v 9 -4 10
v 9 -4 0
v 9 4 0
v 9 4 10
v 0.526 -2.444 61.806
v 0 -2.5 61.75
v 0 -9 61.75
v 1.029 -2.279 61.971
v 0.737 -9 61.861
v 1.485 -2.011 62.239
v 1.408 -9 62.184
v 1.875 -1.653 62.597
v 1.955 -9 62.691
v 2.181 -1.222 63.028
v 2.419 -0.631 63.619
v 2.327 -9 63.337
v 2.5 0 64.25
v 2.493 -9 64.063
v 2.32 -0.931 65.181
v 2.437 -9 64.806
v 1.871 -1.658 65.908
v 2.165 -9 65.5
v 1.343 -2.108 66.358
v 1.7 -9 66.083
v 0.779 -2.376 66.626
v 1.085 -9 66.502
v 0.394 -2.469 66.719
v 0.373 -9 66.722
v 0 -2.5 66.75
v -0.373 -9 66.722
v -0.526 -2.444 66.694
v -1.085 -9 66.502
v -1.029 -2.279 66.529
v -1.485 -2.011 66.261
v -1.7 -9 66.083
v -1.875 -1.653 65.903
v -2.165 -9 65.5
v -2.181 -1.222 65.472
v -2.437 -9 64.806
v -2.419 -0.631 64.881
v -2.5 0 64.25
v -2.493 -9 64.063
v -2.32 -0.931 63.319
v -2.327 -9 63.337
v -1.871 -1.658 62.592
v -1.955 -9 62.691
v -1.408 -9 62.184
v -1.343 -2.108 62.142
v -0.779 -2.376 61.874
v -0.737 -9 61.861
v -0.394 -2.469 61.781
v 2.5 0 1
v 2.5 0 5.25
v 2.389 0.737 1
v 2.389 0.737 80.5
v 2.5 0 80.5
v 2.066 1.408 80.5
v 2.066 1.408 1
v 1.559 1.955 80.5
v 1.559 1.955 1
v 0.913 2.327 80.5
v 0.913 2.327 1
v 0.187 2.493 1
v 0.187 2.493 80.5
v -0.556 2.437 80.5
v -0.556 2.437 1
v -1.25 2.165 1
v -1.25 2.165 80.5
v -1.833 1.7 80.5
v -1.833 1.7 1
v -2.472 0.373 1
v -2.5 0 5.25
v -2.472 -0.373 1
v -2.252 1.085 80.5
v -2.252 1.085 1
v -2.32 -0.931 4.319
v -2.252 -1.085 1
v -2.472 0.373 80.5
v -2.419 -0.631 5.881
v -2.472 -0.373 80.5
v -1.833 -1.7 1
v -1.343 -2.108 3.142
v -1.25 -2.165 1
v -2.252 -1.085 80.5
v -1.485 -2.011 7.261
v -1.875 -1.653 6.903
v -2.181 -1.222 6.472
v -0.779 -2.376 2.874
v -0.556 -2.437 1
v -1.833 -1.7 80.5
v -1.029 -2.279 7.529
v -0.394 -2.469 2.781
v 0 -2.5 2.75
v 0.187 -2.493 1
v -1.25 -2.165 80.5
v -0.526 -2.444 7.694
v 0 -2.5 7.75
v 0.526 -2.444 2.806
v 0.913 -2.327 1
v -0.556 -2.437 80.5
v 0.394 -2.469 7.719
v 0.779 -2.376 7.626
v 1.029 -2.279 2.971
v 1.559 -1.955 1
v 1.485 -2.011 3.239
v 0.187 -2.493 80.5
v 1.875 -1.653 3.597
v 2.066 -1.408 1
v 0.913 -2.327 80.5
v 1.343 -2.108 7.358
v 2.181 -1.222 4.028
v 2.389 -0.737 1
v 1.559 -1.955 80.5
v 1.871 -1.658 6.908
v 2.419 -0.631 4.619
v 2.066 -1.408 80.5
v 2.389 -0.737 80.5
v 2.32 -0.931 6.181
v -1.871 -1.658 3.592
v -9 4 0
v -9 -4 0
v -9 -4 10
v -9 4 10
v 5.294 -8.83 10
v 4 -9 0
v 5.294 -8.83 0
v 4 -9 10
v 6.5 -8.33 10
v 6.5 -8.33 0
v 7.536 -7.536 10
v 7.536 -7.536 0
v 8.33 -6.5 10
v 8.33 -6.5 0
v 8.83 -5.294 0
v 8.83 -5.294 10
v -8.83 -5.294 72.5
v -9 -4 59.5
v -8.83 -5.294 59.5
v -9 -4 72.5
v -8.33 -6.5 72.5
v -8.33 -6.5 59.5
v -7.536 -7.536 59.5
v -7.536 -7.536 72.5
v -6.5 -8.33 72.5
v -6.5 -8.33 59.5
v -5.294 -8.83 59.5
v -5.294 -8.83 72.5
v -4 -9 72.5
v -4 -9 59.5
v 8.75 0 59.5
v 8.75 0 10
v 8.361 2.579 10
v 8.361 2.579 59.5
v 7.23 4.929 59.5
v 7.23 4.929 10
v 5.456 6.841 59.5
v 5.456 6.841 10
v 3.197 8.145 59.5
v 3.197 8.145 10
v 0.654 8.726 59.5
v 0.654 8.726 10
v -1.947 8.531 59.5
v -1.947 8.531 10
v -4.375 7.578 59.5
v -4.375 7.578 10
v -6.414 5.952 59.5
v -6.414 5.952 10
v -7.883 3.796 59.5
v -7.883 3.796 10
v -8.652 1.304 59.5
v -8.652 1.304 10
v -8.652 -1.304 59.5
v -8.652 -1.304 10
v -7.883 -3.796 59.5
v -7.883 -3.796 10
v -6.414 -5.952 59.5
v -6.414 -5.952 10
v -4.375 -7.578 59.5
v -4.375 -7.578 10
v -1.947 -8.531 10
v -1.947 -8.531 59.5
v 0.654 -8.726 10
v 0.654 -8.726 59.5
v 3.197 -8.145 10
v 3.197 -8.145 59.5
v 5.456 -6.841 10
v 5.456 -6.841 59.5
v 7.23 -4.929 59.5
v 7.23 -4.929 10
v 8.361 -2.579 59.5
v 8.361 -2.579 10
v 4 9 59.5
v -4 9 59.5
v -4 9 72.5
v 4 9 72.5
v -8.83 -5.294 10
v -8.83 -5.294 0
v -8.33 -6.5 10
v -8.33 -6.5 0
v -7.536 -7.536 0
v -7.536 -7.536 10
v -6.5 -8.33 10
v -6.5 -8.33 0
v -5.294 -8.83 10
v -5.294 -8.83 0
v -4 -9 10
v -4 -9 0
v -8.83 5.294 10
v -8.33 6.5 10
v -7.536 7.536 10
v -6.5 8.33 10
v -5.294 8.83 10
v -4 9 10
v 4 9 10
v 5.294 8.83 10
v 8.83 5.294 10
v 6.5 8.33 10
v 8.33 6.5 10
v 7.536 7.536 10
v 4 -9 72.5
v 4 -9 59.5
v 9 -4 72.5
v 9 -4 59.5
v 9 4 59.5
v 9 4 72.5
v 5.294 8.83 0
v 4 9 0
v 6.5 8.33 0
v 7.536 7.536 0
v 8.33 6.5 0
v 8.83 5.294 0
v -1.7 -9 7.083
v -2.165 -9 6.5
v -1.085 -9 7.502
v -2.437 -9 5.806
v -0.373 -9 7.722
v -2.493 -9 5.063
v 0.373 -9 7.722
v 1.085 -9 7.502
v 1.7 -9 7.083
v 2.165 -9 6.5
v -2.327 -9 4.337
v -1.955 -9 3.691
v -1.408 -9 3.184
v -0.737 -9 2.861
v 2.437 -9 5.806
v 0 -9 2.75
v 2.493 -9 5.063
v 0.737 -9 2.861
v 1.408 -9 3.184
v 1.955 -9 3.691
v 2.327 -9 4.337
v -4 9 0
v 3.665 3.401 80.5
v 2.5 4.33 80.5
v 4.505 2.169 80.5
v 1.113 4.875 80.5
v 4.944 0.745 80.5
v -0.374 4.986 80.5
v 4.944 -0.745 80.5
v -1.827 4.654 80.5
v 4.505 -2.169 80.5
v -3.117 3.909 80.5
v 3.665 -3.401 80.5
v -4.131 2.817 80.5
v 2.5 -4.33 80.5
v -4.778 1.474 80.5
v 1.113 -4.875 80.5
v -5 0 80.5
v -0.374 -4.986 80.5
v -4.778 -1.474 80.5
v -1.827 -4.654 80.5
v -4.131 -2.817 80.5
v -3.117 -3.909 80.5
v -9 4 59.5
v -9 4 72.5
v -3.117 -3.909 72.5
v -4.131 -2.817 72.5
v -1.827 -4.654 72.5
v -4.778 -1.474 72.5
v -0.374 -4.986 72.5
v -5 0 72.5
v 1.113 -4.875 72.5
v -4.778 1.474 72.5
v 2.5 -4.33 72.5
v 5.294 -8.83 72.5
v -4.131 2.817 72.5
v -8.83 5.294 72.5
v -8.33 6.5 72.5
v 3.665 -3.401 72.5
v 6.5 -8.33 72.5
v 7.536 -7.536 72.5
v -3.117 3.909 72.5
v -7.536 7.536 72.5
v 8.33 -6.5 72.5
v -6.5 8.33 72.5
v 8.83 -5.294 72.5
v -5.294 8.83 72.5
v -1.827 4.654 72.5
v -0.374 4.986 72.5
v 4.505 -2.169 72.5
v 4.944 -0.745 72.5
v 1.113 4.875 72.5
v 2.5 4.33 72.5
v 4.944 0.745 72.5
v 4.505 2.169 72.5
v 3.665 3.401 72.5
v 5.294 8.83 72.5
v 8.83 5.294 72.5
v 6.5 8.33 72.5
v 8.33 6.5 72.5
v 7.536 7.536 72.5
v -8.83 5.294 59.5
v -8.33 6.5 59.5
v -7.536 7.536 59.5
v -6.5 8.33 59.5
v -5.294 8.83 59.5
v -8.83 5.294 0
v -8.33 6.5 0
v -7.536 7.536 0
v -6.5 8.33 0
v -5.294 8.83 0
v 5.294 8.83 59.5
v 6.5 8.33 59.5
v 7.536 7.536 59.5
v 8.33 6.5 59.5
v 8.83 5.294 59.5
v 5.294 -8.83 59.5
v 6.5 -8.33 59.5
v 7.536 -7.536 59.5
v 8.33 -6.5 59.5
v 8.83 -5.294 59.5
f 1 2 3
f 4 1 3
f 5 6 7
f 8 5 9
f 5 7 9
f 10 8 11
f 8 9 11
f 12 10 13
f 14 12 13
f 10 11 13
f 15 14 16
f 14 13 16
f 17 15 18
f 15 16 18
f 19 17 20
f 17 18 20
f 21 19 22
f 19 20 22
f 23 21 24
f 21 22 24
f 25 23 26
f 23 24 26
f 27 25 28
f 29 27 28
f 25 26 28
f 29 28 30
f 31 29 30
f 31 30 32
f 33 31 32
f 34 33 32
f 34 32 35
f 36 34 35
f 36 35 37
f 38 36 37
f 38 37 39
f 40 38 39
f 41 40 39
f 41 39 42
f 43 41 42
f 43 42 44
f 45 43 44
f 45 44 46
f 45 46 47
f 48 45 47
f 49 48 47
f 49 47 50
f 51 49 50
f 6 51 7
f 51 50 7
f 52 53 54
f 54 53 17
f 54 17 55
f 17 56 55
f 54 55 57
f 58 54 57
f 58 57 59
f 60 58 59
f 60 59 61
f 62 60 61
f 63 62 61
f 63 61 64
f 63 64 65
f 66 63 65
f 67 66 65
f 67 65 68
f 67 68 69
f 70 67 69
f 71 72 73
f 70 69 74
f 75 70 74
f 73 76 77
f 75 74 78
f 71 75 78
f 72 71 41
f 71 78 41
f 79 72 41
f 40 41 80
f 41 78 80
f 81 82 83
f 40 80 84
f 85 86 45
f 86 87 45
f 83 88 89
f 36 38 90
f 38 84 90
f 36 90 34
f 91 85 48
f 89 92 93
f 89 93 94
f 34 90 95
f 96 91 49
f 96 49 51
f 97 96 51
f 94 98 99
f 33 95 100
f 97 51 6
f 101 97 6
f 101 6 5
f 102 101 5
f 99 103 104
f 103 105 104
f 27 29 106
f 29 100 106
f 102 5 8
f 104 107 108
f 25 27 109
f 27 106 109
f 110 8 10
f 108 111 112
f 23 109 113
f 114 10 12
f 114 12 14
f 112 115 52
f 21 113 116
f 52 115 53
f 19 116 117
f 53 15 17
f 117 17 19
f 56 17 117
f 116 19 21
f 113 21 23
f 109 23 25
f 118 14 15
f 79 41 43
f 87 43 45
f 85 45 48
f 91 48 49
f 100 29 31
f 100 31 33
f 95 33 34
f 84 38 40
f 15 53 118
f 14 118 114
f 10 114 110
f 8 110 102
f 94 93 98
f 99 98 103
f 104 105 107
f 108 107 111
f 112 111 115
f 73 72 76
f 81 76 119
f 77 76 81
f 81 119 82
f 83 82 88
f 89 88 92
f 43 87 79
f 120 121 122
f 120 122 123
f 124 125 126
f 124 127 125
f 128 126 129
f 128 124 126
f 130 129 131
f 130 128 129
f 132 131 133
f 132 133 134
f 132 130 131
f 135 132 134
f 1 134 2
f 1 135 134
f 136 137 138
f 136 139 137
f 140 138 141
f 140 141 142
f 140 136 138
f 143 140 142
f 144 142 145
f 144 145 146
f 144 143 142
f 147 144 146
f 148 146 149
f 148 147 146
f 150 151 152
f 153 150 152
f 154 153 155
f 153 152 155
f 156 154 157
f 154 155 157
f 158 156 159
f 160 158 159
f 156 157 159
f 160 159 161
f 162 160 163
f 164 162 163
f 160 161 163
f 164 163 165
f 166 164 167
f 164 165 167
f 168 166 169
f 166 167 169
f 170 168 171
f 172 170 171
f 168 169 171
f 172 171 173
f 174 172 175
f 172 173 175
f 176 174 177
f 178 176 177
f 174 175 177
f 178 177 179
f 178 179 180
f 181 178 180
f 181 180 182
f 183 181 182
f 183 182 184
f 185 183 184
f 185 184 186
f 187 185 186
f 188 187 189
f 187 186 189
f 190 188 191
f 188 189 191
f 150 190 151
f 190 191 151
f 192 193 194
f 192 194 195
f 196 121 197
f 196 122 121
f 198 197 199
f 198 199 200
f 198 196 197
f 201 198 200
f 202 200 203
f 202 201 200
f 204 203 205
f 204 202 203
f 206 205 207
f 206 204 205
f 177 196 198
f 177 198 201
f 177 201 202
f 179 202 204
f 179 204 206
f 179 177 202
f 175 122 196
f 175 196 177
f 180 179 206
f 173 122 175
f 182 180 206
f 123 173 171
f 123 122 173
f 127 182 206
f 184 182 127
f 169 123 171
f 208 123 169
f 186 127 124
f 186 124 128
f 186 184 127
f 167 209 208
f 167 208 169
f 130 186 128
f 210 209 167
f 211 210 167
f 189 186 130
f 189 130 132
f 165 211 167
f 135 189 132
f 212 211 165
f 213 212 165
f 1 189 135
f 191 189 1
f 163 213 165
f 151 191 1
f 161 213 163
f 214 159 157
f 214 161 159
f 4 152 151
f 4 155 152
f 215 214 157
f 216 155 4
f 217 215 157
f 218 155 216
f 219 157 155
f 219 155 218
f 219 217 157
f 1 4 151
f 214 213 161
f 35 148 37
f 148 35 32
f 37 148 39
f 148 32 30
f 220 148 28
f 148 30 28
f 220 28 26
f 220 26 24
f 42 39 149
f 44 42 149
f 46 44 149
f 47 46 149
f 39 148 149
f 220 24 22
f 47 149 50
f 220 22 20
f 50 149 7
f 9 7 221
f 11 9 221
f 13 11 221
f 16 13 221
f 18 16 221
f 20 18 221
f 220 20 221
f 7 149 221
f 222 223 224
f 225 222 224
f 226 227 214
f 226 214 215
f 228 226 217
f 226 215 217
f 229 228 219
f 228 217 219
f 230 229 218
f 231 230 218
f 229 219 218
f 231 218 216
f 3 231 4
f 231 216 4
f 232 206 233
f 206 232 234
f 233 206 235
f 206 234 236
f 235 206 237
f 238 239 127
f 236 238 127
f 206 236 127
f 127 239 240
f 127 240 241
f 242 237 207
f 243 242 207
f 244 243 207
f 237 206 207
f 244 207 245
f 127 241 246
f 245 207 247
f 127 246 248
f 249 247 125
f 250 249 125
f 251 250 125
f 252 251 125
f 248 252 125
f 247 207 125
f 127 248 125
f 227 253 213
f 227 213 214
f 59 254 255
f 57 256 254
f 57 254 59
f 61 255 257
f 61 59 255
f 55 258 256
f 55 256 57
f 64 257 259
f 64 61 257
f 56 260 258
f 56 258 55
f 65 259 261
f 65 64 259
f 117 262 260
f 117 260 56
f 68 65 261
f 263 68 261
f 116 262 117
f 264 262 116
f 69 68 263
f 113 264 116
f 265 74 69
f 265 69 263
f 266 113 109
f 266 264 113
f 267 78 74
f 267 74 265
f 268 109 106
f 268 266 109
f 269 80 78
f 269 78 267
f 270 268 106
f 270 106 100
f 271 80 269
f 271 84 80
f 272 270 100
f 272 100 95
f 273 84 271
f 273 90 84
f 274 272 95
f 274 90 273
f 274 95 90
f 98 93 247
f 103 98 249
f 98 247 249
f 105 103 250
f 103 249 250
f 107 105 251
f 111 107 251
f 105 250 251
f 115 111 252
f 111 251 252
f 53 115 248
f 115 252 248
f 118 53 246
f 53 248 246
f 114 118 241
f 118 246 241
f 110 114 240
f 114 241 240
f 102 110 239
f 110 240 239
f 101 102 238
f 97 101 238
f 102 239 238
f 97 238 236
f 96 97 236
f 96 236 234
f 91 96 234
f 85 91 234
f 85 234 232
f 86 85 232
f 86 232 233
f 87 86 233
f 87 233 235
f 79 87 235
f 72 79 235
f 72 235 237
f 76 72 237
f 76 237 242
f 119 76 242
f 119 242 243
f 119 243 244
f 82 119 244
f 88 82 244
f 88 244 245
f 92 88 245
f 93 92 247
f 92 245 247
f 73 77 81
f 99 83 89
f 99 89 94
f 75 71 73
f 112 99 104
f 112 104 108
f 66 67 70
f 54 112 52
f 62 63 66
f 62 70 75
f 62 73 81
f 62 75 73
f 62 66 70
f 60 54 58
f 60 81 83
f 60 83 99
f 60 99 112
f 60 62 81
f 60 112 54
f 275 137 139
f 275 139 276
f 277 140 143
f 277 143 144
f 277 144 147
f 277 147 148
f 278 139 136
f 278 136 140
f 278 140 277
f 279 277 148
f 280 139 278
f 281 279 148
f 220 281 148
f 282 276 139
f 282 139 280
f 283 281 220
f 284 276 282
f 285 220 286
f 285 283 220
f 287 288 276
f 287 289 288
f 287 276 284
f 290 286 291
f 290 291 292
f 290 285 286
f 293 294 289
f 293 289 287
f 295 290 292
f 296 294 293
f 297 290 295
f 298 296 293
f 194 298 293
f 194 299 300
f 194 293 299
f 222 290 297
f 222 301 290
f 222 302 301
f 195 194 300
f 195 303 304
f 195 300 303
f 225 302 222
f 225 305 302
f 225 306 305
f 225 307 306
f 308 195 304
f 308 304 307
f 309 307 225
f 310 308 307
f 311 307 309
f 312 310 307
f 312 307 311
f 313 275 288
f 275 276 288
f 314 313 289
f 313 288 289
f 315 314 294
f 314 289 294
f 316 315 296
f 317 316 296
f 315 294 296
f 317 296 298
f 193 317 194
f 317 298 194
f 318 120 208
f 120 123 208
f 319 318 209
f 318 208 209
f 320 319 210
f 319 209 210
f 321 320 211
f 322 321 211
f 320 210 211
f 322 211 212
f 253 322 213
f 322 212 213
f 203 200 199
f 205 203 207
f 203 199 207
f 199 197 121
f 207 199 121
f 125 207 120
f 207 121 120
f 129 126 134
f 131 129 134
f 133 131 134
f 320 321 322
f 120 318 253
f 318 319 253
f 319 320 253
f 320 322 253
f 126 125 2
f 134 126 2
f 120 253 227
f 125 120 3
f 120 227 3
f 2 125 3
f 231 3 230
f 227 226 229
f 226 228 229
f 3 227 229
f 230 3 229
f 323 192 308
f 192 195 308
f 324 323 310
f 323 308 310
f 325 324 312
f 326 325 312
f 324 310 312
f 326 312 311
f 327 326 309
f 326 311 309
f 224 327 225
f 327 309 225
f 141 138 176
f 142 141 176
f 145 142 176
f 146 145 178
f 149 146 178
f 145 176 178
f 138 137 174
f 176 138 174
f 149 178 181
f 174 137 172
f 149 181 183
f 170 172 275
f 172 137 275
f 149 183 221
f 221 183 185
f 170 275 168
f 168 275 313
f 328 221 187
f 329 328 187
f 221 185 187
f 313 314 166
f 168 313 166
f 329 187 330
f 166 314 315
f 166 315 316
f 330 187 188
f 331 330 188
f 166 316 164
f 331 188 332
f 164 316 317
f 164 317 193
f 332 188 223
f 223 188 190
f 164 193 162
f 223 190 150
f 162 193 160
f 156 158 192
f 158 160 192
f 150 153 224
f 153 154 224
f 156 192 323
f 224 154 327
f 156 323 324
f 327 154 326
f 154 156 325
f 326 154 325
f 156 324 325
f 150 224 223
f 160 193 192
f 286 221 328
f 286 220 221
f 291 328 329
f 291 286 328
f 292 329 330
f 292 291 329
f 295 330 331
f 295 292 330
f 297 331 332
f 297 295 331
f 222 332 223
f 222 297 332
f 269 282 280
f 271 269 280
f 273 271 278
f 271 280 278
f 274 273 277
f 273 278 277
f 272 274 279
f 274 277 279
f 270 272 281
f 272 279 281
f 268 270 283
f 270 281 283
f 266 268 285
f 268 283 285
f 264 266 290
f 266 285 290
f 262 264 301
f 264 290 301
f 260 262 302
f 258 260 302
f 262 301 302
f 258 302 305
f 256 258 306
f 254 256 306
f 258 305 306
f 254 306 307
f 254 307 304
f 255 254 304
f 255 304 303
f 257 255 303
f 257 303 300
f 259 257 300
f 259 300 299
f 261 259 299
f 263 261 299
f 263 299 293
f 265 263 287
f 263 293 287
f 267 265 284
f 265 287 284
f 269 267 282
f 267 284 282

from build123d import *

# Parameters (mm, degrees)
SKETCH_1_W               = 18
SKETCH_1_H               = 18
EXTRUDE_1_DEPTH          = 10
SKETCH_2_R               = 8.75
EXTRUDE_2_DEPTH          = 49.5
SKETCH_3_W               = 18
SKETCH_3_H               = 18
EXTRUDE_3_DEPTH          = 13
SKETCH_4_R               = 5
EXTRUDE_4_DEPTH          = 8
SKETCH_5_R               = 2.5
CUT_EXTRUDE_1_DEPTH      = 79.5
FILLET_1_R               = 5
CUT_EXTRUDE_2_REACH      = 84.977
CUT_EXTRUDE_2_END_RADIUS = 2.5
SKETCH_6_R               = 2.5


with BuildPart() as part:
    # 草图1 → 凸台-拉伸1 (new body)
    with BuildSketch(Plane.XY):
        Rectangle(SKETCH_1_W, SKETCH_1_H)
    extrude(amount=EXTRUDE_1_DEPTH)

    # 草图2 → 凸台-拉伸2 (add)
    with BuildSketch(Plane.XY.offset(10)):
        Circle(SKETCH_2_R)
    extrude(amount=EXTRUDE_2_DEPTH)

    # 草图3 → 凸台-拉伸3 (add)
    with BuildSketch(Plane.XY.offset(59.5)):
        Rectangle(SKETCH_3_W, SKETCH_3_H)
    extrude(amount=EXTRUDE_3_DEPTH)

    # 草图4 → 凸台-拉伸4 (add)
    with BuildSketch(Plane.XY.offset(72.5)):
        with Locations(Location((0, 0, 0), (0, 0, 180))):
            Circle(SKETCH_4_R)
    extrude(amount=EXTRUDE_4_DEPTH)

    # 草图5 → 切除-拉伸1 (cut)
    with BuildSketch(Plane.XY.offset(80.5)):
        Circle(SKETCH_5_R)
    extrude(amount=-CUT_EXTRUDE_1_DEPTH, mode=Mode.SUBTRACT)

    # 圆角1
    fillet_1_edges = [part.edges().sort_by_distance(p)[0] for p in [
        (9, -9, 66),
        (9, 9, 66),
        (-9, 9, 66),
        (-9, -9, 66),
        (9, -9, 5),
        (-9, -9, 5),
        (-9, 9, 5),
        (9, 9, 5),
    ]]
    fillet(fillet_1_edges, radius=FILLET_1_R)

    # 切除-拉伸2: up to this cylinder (the profile starts outside it)
    cut_extrude_2_end = Plane(origin=(0, 0, 34.75), z_dir=(0, 0, 1)) * Cylinder(CUT_EXTRUDE_2_END_RADIUS, 234.954, mode=Mode.PRIVATE)
    # 草图6 → 切除-拉伸2 (cut, up to the surface)
    with BuildSketch(Plane.XZ.offset(9), mode=Mode.PRIVATE) as cut_extrude_2_sk1:
        with Locations(Location((0, 5.25, 0), (0, 0, 270))):
            Circle(SKETCH_6_R)
    cut_extrude_2_tool1 = extrude(cut_extrude_2_sk1.sketch, amount=-CUT_EXTRUDE_2_REACH, mode=Mode.PRIVATE) - cut_extrude_2_end
    add(cut_extrude_2_tool1.solids().sort_by_distance((0, -9, 5.25))[0], mode=Mode.SUBTRACT)
    # 草图6 → 切除-拉伸2 (cut, up to the surface)
    with BuildSketch(Plane.XZ.offset(9), mode=Mode.PRIVATE) as cut_extrude_2_sk2:
        with Locations(Location((0, 64.25, 0), (0, 0, 270))):
            Circle(SKETCH_6_R)
    cut_extrude_2_tool2 = extrude(cut_extrude_2_sk2.sketch, amount=-CUT_EXTRUDE_2_REACH, mode=Mode.PRIVATE) - cut_extrude_2_end
    add(cut_extrude_2_tool2.solids().sort_by_distance((0, -9, 64.25))[0], mode=Mode.SUBTRACT)


solid = part.part
